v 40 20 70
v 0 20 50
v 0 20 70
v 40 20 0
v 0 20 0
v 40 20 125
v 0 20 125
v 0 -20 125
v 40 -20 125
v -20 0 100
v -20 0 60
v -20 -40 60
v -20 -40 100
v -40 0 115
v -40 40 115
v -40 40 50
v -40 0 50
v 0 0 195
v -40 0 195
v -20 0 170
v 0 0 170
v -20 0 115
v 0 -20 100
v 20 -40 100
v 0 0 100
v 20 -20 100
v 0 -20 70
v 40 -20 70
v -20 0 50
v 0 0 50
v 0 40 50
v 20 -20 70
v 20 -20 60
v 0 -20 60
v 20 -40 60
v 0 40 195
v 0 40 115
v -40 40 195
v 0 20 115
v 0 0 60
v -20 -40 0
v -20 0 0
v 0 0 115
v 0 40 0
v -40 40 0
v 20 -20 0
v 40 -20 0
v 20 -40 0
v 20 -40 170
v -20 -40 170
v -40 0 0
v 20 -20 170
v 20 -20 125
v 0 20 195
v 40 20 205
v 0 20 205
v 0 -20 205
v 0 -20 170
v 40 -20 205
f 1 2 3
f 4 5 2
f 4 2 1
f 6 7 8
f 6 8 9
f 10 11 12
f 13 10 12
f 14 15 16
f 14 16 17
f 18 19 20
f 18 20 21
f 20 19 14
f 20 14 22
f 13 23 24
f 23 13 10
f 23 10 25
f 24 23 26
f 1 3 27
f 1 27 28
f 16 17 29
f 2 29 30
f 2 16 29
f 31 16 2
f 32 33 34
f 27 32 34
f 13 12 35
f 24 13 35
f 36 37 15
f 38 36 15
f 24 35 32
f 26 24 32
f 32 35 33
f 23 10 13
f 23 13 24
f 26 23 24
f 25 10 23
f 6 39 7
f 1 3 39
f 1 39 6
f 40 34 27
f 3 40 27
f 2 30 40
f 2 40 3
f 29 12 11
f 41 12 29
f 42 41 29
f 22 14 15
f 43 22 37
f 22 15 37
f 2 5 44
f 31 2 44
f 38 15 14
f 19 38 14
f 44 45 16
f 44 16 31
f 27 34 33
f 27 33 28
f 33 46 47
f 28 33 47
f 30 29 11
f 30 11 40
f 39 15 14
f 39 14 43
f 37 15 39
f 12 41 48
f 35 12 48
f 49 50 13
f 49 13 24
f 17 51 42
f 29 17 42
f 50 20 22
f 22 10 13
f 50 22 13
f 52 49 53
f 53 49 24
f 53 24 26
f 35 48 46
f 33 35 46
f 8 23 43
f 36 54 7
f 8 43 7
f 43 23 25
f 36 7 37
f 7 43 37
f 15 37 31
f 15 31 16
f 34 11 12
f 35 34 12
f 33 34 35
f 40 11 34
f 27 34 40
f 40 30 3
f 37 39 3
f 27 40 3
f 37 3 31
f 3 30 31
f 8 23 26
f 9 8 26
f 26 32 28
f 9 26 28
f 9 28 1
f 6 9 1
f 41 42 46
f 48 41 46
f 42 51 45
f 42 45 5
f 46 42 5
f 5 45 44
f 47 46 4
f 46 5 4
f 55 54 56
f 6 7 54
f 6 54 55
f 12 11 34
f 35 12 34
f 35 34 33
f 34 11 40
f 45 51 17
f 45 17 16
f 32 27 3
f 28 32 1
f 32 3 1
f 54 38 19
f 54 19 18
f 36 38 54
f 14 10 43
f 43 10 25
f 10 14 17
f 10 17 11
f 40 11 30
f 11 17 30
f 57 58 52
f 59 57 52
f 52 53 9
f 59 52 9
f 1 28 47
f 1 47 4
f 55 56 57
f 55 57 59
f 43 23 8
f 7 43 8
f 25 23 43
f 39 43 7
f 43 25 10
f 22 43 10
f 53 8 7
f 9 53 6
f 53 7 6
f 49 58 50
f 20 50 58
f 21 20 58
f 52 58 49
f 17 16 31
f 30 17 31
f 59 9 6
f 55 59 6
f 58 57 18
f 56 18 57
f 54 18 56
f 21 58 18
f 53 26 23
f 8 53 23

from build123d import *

# Parameters (mm, degrees)
F0_W      = 40
F0_H      = 40
F1_DEPTH  = 50
F2_W      = 40
F2_H      = 40
F3_DEPTH  = 60
F4_W      = 40
F4_H      = 40
F5_DEPTH  = 70
F7_DEPTH  = 65
F9_DEPTH  = 40
F10_W     = 40
F10_H     = 40
F11_DEPTH = 55
F14_DEPTH = 70
F16_DEPTH = 80
F17_W     = 40
F17_H     = 40
F18_DEPTH = 80


with BuildPart() as f1:
    # F0 (on Top) → F1 (new body)
    with BuildSketch(Plane.XY):
        with Locations((-20, 20)):
            Rectangle(F0_W, F0_H)
    extrude(amount=F1_DEPTH)

    # F2 (on Top) → F3 (join)
    with BuildSketch(Plane.XY):
        with Locations((0, -20)):
            Rectangle(F2_W, F2_H)
    extrude(amount=F3_DEPTH)

    # F4 (on Top) → F5 (join)
    with BuildSketch(Plane.XY):
        with Locations((20, 0)):
            Rectangle(F4_W, F4_H)
    extrude(amount=F5_DEPTH)


with BuildPart() as f7:
    # F6 (on face) → F7 (new body)
    with BuildSketch(Plane.XY.offset(50)):
        Polygon((-20, 0), (0, 0), (0, 20), (0, 40), (-40, 40), (-40, 0), align=None)
    extrude(amount=F7_DEPTH)

    # F8 (on face) → F9 (join)
    with BuildSketch(Plane.XY.offset(60)):
        Polygon((20, -40), (20, -20), (0, -20), (0, 0), (-20, 0), (-20, -40), align=None)
    extrude(amount=F9_DEPTH)

    # F10 (on face) → F11 (join)
    with BuildSketch(Plane.XY.offset(70)):
        with Locations((20, 0)):
            Rectangle(F10_W, F10_H)
    extrude(amount=F11_DEPTH)

    # F12: union 


with BuildPart() as f14:
    # F13 (on face) → F14 (new body)
    with BuildSketch(Plane.XY.offset(100)):
        Polygon((-20, -40), (20, -40), (20, -20), (0, -20), (0, 0), (-20, 0), align=None)
    extrude(amount=F14_DEPTH)

    # F15 (on face) → F16 (join)
    with BuildSketch(Plane.XY.offset(115)):
        Polygon((-40, 40), (-40, 0), (0, 0), (0, 20), (0, 40), align=None)
    extrude(amount=F16_DEPTH)

    # F17 (on face) → F18 (join)
    with BuildSketch(Plane.XY.offset(125)):
        with Locations((20, 0)):
            Rectangle(F17_W, F17_H)
    extrude(amount=F18_DEPTH)


solid = Compound([f1.part, f7.part, f14.part])
